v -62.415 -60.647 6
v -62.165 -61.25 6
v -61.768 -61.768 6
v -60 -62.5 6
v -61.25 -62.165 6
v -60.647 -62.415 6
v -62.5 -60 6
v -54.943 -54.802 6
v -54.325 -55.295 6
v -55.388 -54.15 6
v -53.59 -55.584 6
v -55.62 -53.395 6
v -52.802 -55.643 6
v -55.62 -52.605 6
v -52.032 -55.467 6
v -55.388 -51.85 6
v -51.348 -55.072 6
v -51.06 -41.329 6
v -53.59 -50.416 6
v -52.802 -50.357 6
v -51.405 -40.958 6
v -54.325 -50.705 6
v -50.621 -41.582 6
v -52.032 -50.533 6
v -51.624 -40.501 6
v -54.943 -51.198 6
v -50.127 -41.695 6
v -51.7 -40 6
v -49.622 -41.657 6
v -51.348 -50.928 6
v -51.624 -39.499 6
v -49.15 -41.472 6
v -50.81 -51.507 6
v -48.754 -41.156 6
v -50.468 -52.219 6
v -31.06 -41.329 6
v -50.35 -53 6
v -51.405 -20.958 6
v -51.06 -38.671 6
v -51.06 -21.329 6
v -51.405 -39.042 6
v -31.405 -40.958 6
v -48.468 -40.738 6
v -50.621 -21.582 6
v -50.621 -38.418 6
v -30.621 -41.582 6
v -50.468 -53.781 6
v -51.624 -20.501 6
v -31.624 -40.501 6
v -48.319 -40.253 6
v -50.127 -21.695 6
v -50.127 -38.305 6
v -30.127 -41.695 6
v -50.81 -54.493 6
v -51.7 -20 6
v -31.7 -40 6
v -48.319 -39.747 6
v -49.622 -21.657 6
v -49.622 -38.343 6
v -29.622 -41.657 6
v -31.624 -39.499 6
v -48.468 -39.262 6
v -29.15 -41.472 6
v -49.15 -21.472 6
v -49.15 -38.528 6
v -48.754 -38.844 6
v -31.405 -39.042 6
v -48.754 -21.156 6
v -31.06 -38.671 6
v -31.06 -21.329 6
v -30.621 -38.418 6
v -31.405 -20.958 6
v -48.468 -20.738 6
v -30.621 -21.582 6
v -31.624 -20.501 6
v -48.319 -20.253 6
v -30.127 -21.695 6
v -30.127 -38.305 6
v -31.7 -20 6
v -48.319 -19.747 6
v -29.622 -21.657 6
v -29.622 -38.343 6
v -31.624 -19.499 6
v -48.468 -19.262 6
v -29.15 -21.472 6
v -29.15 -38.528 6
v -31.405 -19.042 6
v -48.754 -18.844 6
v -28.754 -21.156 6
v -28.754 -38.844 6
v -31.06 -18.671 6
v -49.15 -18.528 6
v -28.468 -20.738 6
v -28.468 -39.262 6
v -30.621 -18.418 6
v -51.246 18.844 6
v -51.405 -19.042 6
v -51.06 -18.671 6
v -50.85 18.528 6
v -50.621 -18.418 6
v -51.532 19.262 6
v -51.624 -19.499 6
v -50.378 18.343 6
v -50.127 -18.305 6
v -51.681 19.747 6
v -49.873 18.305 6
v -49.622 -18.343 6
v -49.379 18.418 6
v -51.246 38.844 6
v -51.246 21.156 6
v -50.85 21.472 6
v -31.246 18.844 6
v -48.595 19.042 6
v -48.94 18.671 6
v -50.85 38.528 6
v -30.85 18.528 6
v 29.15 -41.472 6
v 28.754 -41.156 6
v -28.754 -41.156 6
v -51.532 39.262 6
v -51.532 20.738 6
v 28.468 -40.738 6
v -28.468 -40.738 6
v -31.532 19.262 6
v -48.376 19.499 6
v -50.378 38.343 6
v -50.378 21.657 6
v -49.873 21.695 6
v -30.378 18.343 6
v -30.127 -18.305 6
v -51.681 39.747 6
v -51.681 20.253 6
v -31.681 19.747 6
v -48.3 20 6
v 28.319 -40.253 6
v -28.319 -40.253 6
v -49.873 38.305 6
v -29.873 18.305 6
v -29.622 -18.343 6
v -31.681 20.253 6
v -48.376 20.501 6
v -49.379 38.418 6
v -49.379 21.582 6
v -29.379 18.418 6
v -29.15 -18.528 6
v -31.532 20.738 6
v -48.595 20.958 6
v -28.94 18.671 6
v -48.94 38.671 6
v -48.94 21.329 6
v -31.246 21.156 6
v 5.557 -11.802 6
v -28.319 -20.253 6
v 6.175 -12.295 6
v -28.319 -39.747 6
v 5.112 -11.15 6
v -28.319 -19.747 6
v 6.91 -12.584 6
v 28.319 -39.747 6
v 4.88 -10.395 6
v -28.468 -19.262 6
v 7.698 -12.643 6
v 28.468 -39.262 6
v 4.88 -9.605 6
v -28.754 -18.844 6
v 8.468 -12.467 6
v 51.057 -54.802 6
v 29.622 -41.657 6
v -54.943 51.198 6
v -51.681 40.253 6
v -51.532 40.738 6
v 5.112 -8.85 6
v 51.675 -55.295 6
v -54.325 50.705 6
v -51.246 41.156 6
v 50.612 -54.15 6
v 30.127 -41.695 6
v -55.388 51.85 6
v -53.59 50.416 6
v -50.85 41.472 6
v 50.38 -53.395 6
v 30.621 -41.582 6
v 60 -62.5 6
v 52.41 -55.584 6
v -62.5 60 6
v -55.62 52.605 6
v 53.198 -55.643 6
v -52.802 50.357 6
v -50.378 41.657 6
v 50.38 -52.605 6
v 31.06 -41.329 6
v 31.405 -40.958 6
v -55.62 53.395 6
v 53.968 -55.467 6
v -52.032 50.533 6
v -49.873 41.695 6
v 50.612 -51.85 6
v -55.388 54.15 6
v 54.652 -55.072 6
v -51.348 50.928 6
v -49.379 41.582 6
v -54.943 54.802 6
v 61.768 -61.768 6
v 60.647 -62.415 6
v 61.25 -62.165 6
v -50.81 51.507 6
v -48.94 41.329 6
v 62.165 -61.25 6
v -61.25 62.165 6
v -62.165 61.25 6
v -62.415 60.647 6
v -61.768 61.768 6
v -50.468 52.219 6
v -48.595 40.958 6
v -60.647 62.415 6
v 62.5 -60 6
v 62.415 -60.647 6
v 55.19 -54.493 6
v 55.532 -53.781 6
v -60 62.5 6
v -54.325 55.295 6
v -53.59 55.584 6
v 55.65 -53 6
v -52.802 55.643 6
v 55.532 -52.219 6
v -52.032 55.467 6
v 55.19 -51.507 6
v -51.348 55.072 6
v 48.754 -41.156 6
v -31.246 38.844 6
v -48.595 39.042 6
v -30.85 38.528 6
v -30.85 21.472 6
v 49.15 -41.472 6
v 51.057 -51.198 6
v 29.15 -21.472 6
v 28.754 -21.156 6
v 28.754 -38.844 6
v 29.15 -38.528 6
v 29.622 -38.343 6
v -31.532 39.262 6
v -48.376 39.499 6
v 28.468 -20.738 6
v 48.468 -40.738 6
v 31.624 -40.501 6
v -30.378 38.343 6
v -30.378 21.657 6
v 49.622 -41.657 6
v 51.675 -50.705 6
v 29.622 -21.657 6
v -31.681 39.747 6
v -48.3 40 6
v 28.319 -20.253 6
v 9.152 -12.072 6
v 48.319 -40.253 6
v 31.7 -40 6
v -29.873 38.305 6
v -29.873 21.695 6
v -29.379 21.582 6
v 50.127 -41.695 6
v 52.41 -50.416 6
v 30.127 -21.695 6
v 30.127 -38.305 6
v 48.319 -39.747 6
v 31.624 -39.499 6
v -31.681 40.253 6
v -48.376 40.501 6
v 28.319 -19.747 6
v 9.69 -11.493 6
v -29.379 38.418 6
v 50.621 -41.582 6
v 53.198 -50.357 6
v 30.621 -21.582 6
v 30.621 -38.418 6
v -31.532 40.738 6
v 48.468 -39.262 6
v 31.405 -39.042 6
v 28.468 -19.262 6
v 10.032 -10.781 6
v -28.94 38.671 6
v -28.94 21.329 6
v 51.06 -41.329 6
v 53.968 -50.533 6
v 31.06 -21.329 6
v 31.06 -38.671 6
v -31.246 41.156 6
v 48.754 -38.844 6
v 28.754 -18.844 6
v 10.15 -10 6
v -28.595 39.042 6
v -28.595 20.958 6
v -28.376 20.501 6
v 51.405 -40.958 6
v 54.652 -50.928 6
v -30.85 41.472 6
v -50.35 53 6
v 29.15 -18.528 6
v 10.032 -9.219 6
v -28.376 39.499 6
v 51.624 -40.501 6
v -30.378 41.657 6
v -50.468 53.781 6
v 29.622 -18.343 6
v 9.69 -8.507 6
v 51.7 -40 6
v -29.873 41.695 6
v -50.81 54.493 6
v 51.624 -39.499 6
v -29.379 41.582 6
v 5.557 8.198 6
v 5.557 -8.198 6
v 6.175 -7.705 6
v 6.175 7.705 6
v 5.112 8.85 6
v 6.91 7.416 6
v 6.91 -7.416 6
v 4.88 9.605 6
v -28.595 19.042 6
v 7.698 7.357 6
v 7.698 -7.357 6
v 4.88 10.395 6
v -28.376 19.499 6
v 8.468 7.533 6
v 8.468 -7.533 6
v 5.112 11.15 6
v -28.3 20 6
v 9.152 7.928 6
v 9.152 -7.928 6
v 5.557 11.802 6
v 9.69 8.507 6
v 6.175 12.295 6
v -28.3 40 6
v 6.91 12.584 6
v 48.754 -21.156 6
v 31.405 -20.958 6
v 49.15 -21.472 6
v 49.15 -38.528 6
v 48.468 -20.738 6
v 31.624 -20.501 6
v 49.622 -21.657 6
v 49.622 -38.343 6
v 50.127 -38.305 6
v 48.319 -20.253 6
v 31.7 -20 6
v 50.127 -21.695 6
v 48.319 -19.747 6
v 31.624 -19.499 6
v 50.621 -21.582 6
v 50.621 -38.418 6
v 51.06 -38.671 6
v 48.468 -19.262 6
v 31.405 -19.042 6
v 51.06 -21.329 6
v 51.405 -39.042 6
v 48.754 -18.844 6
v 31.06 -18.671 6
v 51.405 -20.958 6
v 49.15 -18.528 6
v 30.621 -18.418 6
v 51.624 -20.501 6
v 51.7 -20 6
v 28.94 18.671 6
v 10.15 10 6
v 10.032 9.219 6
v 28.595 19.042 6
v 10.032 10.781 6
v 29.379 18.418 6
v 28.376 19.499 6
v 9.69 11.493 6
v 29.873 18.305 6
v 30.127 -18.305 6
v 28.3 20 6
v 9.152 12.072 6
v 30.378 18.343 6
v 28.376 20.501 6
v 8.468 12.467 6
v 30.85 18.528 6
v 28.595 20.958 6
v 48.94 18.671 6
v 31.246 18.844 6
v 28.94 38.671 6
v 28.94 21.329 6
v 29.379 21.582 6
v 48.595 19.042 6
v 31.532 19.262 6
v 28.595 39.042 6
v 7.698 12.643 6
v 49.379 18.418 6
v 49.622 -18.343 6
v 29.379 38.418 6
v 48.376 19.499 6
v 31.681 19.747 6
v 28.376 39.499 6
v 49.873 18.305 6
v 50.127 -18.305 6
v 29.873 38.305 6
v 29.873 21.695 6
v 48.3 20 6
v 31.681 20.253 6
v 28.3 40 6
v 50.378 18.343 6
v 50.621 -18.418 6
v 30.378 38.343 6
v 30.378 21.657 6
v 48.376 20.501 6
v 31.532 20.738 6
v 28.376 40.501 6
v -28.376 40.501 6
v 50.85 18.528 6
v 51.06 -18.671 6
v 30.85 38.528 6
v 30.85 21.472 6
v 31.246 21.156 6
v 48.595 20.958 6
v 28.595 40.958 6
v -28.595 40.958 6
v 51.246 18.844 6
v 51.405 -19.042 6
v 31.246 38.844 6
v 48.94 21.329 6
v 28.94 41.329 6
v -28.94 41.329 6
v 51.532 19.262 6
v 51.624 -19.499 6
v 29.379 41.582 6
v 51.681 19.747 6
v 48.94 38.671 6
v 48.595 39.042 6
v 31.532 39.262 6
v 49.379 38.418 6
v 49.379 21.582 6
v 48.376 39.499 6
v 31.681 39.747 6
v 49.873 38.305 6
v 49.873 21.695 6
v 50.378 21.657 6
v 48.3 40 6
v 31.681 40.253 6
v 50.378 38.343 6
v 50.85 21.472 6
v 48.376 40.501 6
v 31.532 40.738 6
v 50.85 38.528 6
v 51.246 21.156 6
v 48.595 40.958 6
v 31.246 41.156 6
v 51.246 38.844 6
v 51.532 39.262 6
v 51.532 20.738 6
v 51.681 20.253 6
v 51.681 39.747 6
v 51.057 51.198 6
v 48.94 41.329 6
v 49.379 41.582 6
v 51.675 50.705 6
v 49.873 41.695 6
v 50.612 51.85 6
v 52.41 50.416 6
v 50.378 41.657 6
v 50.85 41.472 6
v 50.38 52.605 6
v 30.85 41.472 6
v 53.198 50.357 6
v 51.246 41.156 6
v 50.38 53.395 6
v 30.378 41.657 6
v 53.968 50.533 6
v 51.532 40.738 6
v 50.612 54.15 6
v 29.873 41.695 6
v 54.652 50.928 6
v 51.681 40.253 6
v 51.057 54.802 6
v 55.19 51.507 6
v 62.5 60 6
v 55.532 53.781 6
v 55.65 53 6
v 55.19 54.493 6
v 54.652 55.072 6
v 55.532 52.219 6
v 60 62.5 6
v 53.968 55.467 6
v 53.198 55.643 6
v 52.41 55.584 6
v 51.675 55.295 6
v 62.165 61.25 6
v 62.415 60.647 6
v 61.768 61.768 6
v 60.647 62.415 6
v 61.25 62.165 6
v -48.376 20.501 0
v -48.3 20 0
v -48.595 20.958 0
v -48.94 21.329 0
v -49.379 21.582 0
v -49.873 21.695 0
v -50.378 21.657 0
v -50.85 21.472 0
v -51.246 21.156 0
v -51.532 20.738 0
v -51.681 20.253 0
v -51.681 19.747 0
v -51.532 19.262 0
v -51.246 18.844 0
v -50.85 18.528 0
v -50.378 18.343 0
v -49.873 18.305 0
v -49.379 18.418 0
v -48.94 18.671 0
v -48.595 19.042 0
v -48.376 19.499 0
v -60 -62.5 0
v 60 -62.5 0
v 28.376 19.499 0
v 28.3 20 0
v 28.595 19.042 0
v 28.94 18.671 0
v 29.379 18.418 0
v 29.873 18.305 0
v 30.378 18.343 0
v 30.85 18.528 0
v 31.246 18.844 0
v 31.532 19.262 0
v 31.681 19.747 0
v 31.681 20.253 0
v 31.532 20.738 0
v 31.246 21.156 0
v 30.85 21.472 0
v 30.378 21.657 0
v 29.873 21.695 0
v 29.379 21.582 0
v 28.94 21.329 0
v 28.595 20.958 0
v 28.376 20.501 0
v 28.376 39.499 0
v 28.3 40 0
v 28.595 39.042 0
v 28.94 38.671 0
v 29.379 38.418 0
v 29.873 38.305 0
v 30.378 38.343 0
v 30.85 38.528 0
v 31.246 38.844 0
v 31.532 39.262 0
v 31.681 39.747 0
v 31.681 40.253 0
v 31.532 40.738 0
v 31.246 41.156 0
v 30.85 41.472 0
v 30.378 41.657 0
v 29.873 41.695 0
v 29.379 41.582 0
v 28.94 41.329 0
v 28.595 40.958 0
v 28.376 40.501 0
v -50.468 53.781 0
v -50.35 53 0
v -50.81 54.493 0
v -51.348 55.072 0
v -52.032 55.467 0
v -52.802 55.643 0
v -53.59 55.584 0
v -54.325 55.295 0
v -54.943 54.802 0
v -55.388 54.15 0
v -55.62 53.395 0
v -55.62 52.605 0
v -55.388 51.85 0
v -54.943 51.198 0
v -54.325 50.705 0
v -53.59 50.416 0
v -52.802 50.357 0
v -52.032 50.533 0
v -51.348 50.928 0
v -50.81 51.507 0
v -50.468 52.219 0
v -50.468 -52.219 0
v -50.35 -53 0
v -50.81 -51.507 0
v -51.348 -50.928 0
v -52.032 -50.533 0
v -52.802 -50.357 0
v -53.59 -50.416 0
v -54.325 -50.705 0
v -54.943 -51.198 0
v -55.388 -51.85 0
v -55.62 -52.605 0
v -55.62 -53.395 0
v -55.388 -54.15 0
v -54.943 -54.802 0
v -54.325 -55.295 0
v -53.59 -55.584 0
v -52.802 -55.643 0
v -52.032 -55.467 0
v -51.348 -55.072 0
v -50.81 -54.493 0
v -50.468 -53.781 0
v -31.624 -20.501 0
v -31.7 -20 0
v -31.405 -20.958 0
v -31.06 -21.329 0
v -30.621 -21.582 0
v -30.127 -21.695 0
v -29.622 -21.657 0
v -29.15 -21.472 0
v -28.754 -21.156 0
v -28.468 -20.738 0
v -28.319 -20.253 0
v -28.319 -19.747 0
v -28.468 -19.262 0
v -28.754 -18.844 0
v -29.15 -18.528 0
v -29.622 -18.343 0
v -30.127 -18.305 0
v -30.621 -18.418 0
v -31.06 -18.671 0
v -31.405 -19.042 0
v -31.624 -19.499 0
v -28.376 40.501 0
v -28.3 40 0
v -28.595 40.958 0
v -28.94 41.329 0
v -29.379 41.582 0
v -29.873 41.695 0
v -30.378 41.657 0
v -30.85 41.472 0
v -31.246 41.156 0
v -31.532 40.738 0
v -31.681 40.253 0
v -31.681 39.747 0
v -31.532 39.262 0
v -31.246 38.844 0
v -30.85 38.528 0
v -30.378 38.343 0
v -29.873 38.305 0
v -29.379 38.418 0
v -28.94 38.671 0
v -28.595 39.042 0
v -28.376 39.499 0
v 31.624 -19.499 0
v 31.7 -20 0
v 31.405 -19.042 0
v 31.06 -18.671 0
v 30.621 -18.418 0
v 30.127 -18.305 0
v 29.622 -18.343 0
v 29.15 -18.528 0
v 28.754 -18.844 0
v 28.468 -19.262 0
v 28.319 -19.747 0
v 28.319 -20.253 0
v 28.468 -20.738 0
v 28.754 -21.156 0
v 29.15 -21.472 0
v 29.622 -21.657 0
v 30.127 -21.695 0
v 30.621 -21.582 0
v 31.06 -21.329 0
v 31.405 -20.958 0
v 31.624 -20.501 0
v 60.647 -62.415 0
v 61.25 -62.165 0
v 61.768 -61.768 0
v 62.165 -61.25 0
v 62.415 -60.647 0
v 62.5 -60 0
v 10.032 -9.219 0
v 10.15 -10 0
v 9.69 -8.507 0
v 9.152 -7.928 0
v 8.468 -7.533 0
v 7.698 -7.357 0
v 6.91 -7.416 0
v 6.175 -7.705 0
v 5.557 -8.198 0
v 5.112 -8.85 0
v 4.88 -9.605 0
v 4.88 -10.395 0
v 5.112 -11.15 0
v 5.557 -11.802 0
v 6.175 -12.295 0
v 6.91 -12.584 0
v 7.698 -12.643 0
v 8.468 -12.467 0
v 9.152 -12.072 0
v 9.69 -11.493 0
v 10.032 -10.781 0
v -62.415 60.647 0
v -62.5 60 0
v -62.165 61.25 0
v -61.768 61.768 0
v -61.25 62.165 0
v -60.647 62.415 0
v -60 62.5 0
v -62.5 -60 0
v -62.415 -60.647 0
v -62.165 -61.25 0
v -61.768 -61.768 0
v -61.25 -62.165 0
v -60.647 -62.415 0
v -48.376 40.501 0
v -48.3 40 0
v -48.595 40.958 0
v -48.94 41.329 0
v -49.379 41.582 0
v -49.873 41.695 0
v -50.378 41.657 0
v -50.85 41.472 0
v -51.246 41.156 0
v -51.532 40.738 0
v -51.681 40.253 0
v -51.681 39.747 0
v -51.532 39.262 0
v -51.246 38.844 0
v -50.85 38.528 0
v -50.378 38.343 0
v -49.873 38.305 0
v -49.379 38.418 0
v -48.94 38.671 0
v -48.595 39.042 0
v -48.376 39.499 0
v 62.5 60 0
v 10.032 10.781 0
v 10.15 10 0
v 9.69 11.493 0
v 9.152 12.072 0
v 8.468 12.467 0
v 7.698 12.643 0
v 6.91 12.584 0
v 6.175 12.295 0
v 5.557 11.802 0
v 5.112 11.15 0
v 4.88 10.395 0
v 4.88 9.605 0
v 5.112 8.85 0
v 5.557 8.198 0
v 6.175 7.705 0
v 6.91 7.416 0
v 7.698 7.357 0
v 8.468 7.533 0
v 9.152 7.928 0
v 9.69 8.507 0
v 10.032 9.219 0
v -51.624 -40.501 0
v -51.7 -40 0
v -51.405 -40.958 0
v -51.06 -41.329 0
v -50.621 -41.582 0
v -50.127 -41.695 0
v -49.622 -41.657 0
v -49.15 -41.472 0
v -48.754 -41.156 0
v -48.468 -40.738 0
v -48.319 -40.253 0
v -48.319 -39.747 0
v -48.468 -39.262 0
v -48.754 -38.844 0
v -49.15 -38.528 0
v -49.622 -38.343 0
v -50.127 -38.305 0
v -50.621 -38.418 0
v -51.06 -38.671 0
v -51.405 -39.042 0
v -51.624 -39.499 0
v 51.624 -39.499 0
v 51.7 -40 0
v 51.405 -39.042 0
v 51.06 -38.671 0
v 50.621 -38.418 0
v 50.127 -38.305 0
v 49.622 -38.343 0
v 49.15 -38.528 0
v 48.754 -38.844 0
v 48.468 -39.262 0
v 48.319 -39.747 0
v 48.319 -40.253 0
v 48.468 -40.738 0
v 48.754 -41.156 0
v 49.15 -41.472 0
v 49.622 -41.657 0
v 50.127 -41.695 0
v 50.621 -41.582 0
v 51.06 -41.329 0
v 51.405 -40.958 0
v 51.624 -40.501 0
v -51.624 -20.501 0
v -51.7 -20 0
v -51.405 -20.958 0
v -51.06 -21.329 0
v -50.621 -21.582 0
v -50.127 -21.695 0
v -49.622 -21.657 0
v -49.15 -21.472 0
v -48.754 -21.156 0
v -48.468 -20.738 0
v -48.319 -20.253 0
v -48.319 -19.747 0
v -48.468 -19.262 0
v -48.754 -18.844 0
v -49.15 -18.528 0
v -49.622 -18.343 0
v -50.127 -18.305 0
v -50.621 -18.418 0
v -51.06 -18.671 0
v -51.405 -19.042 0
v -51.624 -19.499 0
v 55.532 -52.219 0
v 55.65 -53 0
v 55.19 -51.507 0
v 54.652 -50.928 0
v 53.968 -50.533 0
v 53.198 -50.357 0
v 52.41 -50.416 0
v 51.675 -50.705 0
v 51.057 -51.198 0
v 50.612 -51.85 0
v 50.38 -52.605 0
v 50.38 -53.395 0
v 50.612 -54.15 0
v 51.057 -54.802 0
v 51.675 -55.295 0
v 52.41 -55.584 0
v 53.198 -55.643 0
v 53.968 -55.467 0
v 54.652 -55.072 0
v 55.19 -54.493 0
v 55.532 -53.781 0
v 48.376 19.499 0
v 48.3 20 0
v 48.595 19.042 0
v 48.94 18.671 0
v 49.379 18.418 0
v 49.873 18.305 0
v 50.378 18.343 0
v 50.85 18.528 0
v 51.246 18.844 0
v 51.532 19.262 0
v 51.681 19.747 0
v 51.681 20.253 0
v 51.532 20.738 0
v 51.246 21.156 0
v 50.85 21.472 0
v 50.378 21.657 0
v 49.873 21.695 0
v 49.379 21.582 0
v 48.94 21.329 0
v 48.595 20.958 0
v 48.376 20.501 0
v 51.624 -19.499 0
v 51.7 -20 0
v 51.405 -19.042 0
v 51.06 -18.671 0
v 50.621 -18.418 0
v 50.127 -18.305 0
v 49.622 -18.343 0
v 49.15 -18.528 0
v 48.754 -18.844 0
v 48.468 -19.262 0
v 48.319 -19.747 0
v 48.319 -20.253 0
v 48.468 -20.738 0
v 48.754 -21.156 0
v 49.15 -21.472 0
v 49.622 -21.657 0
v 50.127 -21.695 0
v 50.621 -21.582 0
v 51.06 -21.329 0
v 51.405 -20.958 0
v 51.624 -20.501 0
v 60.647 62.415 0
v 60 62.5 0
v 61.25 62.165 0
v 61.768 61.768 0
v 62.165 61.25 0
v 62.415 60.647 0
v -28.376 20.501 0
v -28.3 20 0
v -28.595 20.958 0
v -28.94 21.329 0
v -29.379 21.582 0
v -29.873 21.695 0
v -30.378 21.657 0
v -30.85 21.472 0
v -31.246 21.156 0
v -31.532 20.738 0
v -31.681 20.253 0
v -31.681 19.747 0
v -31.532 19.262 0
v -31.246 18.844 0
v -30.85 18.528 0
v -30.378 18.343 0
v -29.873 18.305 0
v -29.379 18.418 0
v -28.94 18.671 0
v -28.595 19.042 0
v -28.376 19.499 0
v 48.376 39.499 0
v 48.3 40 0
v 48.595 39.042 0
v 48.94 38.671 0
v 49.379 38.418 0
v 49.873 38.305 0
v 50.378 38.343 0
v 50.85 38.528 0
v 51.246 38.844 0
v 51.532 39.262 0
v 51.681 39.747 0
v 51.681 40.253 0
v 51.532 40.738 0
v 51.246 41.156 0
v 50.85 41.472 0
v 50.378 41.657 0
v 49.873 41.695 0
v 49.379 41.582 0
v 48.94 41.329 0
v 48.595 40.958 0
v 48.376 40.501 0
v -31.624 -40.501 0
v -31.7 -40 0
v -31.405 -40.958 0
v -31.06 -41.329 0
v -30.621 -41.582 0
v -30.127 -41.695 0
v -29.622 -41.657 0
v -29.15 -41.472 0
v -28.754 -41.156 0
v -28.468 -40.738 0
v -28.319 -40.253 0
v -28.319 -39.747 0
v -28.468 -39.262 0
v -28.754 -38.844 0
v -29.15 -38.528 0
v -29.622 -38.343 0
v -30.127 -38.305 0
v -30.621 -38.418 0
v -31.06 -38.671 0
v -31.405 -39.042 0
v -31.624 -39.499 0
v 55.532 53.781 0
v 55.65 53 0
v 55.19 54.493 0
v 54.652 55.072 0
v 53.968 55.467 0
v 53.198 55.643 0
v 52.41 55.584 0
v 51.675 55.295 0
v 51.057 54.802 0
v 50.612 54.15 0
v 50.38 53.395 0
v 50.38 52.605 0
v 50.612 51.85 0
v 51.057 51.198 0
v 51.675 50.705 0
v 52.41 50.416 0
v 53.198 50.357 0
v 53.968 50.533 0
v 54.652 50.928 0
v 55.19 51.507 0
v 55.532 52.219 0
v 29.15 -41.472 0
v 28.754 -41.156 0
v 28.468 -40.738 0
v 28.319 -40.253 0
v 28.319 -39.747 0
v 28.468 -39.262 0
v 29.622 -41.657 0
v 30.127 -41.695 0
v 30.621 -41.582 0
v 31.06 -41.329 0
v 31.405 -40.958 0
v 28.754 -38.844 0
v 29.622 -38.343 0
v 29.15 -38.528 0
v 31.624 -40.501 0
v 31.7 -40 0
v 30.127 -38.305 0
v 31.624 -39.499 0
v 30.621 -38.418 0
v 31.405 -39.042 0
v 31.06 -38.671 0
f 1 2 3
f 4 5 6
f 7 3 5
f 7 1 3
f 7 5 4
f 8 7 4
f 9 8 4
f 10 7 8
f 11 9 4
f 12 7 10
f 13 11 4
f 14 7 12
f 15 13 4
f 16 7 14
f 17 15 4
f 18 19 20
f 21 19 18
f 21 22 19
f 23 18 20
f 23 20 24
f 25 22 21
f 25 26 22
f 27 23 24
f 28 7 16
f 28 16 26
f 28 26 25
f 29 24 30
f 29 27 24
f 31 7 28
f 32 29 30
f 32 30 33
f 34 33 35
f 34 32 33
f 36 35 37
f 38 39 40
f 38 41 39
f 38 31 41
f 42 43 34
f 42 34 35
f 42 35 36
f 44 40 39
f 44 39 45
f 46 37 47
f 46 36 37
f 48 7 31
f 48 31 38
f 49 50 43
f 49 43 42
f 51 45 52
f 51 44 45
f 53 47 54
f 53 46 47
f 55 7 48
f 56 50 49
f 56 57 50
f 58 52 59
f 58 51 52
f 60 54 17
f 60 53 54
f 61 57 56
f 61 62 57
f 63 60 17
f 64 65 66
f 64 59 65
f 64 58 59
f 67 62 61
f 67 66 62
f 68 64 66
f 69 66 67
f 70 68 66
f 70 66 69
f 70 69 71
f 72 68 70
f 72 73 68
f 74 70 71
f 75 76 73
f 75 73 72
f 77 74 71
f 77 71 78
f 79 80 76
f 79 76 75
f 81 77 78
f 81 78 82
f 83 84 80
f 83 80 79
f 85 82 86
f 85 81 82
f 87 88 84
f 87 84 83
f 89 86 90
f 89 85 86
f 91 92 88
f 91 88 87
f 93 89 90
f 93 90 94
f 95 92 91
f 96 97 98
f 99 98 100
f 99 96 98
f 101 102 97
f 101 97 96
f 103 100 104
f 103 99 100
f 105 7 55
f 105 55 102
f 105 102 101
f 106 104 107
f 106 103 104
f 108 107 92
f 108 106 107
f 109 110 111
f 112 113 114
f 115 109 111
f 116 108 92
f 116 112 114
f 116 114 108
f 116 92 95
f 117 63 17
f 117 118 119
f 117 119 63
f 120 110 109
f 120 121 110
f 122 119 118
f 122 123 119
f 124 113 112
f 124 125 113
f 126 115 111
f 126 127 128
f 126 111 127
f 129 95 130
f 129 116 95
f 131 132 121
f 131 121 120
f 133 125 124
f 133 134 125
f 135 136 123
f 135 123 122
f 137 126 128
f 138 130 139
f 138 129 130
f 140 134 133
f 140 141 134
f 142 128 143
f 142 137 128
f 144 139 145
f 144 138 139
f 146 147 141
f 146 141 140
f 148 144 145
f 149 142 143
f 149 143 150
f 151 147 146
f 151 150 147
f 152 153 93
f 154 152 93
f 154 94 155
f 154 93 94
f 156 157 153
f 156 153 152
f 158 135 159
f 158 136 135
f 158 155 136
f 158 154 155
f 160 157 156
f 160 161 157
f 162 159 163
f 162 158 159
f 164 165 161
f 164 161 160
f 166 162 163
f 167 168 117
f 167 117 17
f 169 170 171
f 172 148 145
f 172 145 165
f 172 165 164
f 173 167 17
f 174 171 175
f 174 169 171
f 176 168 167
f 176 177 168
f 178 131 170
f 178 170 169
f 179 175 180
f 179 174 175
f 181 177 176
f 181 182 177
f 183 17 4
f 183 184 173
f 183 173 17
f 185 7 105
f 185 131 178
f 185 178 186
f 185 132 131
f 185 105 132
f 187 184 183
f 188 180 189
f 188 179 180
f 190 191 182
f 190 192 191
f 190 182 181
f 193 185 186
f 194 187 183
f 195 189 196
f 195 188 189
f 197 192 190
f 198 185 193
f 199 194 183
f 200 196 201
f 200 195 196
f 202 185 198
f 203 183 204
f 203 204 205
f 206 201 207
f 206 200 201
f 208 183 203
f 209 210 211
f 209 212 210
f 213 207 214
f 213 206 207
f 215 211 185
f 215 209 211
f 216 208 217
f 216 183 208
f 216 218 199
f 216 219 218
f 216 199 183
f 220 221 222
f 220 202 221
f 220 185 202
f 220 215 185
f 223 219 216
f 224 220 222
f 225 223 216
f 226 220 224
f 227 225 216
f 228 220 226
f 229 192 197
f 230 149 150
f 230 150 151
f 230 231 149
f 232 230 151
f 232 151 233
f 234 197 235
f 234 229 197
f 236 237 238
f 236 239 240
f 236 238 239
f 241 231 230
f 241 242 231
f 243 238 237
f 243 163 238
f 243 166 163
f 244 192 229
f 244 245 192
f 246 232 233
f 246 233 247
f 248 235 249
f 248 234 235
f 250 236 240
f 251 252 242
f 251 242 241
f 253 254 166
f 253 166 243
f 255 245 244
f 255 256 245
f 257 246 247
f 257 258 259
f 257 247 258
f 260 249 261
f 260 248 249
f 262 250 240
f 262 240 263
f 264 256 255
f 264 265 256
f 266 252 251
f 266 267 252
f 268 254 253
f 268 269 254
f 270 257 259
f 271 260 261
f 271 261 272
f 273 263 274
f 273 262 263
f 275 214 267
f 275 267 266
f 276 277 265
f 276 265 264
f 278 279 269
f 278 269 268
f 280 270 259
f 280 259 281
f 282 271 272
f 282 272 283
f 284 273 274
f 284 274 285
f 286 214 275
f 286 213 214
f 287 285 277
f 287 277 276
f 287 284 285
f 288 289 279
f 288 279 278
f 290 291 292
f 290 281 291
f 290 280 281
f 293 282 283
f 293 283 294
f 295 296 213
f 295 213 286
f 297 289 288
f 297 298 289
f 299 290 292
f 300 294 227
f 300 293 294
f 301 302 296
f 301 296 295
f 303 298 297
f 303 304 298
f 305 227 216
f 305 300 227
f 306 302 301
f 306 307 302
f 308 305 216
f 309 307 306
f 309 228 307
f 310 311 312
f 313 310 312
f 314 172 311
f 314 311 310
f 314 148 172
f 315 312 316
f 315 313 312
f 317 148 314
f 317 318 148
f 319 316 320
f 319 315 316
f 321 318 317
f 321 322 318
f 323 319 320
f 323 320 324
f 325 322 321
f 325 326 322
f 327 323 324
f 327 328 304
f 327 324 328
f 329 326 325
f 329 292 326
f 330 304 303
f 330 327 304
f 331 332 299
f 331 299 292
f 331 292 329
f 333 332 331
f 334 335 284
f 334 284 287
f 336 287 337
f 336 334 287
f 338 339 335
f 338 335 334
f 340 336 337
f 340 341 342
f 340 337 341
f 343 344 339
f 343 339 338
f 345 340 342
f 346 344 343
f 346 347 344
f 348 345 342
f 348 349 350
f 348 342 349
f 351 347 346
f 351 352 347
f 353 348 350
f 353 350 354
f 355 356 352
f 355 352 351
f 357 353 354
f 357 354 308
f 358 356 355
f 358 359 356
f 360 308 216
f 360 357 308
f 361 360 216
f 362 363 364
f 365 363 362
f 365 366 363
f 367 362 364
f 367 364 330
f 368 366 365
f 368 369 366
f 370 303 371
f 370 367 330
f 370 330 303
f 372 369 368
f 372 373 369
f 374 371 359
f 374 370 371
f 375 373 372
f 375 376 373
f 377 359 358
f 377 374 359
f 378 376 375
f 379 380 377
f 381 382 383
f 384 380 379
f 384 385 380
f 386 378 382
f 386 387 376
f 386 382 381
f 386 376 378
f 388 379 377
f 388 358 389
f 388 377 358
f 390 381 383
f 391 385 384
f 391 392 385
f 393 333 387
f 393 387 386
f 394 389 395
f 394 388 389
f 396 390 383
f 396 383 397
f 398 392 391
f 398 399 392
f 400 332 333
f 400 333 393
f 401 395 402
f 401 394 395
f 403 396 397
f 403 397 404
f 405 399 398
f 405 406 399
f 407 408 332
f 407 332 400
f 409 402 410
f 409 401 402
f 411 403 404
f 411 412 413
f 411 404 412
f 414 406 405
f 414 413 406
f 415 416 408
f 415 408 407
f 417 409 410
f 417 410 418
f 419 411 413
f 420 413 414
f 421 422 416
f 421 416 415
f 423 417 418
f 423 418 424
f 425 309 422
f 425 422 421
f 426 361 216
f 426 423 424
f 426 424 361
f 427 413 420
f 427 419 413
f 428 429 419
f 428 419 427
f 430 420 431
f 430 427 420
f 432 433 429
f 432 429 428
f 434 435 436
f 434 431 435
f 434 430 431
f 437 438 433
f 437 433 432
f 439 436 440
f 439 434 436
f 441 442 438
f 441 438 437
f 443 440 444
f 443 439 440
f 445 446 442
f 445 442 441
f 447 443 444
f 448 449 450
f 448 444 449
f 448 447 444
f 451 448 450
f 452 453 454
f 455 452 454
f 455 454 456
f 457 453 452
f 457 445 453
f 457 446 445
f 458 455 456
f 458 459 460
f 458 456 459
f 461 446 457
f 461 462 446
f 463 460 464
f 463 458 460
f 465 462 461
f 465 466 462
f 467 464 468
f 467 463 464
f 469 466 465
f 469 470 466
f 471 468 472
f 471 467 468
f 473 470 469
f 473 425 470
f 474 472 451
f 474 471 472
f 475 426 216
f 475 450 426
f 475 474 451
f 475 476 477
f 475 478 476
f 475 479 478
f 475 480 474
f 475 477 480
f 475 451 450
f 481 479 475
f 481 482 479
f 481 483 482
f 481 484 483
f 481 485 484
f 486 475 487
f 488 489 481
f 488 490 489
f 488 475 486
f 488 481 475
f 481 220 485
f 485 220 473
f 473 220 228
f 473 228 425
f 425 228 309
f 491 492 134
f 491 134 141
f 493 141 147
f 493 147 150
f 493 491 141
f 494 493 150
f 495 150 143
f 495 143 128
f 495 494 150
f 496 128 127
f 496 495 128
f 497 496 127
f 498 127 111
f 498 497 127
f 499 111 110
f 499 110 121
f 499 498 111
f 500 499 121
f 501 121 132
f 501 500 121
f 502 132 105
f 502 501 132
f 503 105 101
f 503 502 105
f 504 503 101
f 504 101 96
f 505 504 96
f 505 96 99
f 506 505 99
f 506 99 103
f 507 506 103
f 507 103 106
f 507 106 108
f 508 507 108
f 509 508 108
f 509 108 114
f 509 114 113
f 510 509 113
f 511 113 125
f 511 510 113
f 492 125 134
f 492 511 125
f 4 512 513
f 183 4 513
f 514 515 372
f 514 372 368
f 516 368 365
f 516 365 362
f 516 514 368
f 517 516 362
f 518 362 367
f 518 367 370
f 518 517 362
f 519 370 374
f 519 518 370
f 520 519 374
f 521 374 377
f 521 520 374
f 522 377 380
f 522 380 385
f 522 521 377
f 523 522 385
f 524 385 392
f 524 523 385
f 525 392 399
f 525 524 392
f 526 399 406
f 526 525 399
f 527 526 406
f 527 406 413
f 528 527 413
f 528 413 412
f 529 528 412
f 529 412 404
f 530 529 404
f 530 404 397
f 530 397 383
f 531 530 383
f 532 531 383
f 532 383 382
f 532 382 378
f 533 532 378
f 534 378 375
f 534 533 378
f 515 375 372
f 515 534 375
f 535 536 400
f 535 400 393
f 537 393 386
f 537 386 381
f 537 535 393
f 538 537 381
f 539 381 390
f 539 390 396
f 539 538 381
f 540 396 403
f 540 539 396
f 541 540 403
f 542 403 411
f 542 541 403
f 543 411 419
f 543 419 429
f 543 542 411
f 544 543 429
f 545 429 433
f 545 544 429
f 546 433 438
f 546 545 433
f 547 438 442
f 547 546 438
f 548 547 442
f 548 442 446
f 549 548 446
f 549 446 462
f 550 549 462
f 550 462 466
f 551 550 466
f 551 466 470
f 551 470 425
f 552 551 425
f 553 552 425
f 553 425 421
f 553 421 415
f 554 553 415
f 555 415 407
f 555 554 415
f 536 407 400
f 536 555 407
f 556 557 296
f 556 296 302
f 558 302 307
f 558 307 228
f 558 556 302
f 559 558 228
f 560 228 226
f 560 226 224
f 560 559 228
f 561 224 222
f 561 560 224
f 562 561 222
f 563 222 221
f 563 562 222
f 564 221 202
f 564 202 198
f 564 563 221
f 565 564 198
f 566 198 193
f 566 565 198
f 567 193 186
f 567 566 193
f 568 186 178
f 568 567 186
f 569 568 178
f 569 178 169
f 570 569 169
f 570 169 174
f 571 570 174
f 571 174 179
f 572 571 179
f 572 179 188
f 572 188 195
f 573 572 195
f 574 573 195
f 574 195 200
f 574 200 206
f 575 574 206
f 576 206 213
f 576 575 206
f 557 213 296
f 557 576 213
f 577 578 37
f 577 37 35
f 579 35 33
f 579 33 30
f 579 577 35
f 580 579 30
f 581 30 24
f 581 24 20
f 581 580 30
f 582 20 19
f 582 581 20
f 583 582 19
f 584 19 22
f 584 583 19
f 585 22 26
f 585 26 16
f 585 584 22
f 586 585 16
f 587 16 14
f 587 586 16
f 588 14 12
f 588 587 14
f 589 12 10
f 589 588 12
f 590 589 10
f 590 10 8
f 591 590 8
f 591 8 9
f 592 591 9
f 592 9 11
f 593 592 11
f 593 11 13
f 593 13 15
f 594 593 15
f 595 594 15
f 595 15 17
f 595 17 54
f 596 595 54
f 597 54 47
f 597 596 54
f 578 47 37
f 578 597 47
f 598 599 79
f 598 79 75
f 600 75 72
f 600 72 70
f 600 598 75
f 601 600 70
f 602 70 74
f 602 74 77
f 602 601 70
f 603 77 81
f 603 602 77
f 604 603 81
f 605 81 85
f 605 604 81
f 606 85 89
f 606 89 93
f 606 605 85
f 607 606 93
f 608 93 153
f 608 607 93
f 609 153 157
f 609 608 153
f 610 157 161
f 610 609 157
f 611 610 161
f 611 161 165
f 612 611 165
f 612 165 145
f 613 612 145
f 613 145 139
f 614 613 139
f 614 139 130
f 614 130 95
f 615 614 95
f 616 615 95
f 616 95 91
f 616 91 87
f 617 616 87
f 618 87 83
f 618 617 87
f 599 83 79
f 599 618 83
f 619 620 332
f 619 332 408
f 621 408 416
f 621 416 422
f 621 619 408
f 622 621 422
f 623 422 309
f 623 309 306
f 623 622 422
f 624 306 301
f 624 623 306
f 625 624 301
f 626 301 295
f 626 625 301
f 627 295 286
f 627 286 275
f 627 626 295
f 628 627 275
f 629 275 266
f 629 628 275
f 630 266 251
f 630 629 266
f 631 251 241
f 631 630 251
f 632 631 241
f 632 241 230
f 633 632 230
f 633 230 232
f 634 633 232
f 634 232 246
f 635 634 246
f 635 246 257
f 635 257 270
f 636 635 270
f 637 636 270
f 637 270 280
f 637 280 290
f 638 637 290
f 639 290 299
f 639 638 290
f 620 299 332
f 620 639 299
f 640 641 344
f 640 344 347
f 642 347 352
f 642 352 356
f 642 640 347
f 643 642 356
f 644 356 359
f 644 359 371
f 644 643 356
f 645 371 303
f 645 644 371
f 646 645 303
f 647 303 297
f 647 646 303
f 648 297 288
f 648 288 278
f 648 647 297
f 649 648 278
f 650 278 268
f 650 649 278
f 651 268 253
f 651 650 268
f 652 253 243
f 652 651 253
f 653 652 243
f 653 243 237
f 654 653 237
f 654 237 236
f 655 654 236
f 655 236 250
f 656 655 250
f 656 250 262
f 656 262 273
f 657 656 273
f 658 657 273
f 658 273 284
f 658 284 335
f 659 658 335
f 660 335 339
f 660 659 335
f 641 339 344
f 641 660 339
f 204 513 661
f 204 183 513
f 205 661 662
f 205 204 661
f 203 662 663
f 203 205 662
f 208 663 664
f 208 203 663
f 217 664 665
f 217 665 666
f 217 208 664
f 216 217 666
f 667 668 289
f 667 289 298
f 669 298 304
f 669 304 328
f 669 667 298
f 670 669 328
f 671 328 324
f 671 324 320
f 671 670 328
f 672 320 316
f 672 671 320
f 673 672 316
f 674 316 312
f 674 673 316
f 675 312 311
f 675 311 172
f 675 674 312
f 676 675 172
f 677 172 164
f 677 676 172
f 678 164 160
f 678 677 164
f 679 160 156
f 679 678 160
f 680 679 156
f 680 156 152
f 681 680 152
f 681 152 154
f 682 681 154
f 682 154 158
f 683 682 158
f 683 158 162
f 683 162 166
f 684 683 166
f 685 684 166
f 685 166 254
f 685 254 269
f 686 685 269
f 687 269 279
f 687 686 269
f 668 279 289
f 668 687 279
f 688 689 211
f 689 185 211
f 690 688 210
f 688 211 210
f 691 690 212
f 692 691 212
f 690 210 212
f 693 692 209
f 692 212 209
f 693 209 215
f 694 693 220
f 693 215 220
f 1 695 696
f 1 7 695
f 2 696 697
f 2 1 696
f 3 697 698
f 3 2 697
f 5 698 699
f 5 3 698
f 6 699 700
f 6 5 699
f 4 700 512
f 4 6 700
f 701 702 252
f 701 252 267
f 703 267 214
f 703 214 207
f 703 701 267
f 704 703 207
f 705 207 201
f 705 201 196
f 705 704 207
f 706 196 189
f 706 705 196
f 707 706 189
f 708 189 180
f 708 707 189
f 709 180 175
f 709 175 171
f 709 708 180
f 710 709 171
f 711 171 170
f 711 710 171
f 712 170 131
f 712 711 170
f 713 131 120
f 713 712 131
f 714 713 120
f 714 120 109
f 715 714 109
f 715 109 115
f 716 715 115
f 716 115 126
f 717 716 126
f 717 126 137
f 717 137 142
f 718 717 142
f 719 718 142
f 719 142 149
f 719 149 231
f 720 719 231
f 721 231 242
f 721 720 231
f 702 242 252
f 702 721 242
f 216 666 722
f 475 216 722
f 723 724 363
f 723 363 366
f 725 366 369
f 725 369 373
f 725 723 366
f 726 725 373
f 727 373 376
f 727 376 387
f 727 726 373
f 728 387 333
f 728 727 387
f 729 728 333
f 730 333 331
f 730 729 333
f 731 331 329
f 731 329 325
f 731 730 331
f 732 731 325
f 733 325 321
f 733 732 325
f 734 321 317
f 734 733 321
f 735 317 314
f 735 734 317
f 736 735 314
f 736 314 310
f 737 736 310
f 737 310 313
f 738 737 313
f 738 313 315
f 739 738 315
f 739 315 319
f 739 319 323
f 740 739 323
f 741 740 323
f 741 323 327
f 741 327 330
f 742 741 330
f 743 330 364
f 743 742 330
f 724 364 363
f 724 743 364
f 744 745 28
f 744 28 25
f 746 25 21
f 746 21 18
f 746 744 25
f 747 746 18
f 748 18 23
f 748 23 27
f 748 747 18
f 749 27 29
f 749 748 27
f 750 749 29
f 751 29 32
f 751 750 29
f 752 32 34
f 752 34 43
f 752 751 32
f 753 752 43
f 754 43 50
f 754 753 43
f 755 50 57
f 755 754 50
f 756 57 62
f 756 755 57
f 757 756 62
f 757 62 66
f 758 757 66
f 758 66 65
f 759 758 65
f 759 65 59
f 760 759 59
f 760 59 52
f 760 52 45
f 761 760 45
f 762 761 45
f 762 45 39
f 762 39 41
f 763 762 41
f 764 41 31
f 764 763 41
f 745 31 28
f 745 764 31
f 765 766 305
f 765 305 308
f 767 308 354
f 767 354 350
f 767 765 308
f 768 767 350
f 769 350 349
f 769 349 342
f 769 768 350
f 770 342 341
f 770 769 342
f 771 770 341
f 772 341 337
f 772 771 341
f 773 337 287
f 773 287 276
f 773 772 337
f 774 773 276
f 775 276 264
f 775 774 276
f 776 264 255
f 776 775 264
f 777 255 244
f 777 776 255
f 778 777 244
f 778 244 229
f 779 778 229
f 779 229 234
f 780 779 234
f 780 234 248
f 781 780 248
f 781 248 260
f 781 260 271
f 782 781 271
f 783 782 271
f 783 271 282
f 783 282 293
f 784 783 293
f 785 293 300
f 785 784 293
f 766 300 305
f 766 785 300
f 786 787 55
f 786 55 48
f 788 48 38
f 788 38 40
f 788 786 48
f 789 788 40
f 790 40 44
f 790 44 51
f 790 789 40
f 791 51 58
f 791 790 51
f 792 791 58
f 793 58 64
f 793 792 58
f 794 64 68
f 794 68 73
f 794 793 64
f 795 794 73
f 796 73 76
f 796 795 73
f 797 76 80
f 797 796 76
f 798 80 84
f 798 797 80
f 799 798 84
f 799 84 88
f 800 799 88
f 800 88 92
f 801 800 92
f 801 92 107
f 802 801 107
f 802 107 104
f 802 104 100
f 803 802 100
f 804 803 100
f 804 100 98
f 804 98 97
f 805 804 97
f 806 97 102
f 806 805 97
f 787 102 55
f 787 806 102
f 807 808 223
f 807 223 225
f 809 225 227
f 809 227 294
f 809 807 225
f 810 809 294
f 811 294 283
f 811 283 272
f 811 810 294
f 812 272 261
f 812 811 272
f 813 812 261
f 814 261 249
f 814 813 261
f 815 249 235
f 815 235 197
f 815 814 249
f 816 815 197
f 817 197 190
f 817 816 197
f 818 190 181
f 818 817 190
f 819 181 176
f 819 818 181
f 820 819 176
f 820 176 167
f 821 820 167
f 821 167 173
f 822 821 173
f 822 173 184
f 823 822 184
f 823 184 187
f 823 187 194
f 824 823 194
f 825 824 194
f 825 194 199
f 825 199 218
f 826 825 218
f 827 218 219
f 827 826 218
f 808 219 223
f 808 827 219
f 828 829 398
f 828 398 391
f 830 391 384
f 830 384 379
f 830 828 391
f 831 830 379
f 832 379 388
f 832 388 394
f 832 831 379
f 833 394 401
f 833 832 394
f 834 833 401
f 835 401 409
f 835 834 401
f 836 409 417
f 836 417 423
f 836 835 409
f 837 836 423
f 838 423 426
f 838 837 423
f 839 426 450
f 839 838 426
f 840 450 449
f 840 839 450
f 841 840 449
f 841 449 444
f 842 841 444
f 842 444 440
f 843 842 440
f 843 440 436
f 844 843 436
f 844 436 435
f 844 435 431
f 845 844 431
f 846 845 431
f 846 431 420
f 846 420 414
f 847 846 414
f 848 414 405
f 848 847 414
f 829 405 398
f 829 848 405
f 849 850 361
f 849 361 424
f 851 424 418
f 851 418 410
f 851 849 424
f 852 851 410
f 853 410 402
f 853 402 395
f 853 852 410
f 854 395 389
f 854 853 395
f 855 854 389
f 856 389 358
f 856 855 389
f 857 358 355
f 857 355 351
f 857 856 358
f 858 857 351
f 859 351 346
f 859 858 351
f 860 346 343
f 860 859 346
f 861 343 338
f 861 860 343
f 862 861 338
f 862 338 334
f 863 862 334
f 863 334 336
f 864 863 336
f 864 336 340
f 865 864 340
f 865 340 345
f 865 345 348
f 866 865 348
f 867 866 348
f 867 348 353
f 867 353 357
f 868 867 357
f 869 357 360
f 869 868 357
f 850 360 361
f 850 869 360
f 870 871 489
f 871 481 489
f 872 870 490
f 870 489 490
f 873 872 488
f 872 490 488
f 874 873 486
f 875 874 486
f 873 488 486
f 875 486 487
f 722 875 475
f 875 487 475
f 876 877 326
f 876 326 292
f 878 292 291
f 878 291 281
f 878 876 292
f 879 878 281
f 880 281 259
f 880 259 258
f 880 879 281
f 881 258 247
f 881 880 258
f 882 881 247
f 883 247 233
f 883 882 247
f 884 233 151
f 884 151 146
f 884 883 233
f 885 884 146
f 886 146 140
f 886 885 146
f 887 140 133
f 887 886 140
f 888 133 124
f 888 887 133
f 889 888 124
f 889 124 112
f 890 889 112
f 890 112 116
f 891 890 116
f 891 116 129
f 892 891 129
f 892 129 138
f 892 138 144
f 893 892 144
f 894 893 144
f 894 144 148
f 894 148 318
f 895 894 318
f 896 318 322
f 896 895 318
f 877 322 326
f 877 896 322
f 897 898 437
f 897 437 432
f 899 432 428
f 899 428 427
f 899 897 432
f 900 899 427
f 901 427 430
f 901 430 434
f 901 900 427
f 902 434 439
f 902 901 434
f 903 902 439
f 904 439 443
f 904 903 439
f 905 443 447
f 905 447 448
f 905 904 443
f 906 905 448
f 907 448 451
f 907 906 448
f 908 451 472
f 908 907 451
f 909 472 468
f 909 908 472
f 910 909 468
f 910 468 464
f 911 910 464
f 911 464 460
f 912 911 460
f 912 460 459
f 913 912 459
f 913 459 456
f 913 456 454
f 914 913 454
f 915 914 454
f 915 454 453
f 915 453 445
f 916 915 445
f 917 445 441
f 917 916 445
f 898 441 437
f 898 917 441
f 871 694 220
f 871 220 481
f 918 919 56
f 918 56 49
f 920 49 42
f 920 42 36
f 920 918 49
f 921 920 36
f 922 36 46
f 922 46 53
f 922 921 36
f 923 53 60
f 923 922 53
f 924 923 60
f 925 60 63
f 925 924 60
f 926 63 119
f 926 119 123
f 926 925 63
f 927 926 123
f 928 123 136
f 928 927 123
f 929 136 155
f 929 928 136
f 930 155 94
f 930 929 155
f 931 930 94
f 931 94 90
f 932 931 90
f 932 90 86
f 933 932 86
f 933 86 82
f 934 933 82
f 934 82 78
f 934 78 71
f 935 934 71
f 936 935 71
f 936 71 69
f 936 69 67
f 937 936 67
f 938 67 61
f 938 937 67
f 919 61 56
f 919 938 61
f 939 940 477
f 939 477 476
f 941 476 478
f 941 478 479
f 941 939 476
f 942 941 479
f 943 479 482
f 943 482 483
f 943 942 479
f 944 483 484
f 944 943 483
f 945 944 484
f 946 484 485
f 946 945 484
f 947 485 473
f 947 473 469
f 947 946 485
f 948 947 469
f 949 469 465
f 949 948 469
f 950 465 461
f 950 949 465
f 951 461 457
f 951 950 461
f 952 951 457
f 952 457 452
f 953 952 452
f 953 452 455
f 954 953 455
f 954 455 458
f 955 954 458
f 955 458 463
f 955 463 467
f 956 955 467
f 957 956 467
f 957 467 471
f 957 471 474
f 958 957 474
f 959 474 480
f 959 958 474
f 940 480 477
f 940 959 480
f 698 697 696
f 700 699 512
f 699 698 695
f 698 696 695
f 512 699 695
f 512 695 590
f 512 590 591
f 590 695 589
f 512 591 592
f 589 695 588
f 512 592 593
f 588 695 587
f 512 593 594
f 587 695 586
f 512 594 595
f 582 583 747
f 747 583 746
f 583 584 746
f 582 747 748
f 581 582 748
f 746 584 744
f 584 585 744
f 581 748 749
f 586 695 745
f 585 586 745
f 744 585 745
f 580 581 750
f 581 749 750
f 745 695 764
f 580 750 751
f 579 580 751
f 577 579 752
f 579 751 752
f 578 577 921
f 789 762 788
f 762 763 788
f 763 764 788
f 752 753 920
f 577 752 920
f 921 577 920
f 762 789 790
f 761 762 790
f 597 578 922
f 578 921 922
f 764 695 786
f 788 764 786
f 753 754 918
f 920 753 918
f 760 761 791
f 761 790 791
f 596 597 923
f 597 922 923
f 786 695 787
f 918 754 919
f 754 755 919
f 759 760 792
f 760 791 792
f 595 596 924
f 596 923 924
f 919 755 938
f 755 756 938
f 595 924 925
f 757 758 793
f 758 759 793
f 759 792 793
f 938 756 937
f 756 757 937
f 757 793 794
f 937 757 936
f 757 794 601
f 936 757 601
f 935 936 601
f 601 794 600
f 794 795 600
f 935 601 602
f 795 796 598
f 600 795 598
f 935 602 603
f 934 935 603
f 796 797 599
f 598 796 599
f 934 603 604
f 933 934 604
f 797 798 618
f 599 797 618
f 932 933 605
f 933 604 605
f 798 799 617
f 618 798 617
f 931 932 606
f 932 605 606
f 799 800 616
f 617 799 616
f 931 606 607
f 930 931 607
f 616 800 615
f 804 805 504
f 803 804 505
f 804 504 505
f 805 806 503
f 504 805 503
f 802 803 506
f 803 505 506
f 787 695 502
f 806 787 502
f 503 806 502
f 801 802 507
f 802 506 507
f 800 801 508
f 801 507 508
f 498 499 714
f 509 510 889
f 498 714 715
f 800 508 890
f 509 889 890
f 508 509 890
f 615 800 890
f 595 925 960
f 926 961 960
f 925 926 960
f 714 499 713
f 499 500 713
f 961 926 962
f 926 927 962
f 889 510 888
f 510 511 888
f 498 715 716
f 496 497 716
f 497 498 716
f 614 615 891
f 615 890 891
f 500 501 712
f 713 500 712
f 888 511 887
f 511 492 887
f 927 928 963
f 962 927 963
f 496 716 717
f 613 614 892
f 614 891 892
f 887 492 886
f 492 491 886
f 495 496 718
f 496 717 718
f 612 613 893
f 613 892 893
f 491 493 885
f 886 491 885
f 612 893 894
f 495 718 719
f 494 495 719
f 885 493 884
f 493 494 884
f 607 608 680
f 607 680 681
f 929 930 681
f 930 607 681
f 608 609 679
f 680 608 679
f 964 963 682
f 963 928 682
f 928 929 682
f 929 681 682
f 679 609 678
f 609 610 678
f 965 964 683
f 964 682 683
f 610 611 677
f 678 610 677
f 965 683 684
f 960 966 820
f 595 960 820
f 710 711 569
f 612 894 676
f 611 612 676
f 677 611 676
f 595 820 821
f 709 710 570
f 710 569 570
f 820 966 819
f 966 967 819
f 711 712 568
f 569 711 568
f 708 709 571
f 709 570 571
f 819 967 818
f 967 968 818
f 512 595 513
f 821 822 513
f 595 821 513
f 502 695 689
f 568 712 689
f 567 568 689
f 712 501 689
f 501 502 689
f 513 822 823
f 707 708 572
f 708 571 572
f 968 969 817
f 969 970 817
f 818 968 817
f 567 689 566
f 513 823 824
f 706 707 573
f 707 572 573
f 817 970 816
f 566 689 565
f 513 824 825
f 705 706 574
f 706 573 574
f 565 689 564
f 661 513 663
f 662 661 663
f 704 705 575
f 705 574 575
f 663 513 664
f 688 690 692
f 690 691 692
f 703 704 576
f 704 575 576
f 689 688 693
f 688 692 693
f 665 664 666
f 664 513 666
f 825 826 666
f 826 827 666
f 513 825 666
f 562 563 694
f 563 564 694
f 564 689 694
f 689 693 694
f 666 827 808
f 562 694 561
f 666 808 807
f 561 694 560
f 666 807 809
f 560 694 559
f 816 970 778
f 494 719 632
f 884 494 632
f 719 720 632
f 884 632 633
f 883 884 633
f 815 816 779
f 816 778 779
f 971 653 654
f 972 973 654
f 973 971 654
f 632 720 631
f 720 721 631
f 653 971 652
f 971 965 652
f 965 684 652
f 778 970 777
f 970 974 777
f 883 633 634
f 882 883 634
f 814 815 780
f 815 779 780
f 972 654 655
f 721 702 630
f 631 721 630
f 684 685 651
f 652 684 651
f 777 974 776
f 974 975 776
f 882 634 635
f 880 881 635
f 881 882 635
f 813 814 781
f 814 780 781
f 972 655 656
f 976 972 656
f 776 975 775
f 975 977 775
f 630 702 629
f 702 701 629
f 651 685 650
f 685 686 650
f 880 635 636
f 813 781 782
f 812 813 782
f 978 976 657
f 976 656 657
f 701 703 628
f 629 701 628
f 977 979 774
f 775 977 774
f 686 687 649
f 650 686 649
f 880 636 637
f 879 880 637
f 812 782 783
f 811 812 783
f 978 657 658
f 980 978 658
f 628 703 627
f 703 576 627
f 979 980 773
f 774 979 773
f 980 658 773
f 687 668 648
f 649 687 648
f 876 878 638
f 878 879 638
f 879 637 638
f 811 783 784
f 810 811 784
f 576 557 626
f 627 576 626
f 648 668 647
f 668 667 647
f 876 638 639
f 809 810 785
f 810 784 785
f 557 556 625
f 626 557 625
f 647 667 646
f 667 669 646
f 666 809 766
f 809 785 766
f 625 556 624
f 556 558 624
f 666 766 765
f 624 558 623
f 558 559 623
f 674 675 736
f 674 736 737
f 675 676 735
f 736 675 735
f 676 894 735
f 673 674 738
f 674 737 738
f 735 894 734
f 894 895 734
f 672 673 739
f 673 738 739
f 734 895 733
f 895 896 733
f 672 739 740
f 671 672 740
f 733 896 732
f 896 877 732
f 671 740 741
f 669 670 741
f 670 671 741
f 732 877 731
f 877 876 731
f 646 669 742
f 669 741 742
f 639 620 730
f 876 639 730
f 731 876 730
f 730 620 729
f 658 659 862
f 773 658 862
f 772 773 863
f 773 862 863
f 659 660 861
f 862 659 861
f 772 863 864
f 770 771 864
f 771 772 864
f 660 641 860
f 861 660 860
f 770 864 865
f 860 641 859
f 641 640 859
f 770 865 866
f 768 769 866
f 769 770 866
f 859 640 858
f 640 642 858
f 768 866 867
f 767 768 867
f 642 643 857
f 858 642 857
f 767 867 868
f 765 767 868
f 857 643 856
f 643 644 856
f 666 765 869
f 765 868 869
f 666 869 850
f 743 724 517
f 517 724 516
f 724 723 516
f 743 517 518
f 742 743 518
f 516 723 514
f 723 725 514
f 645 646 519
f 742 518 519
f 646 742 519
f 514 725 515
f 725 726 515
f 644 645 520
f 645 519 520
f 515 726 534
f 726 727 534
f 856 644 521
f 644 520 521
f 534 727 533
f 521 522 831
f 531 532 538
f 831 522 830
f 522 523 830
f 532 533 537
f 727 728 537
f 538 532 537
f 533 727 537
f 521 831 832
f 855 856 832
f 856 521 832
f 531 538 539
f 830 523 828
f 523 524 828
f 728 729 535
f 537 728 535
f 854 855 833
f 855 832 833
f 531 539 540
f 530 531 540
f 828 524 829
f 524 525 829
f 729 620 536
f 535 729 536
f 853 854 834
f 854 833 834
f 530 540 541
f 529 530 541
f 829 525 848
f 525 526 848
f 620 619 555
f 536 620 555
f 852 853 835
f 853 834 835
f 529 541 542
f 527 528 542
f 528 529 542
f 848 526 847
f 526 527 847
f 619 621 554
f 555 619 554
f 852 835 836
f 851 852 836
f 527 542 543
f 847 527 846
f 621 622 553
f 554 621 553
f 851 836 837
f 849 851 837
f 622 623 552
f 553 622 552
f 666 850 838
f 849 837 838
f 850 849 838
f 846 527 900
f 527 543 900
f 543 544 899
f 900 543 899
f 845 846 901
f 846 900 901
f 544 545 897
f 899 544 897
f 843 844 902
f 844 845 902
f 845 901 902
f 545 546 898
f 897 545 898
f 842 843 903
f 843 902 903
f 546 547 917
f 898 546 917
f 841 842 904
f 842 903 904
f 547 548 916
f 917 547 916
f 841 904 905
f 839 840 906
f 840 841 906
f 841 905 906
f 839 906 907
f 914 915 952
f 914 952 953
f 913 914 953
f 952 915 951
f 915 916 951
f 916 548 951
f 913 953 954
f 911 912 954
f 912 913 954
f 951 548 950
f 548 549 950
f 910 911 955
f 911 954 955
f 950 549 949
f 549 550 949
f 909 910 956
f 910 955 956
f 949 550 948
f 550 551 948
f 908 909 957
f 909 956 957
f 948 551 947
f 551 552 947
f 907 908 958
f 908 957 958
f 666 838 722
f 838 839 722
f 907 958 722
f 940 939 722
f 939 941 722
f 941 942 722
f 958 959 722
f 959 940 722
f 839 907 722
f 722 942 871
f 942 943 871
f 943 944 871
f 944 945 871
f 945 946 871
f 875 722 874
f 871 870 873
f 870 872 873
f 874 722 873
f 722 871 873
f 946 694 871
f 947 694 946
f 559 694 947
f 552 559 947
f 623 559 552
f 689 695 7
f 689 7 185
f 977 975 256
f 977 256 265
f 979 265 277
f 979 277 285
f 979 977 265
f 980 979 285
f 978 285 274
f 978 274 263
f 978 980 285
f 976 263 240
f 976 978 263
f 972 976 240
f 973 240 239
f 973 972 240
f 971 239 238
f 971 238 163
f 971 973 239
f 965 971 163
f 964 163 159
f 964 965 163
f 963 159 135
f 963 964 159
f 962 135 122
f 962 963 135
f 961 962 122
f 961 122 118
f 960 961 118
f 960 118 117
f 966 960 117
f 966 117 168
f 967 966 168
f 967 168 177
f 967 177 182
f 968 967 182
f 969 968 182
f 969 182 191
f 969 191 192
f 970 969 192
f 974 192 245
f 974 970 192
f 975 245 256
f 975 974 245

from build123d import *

# Parameters (mm, degrees)
SKETCH1_W           = 125
SKETCH1_H           = 125
SKETCH1_R           = 1.7
SKETCH1_R_2         = 2.65
BOSS_EXTRUDE1_DEPTH = 6
FILLET1_R           = 2.5


with BuildPart() as part:
    # Sketch1 → Boss-Extrude1 (new body)
    with BuildSketch(Plane.XY):
        Rectangle(SKETCH1_W, SKETCH1_H)
        with Locations((-50, 40)):
            Circle(SKETCH1_R, mode=Mode.SUBTRACT)
        with Locations((-30, 40)):
            Circle(SKETCH1_R, mode=Mode.SUBTRACT)
        with Locations((-30, 20)):
            Circle(SKETCH1_R, mode=Mode.SUBTRACT)
        with Locations((-50, 20)):
            Circle(SKETCH1_R, mode=Mode.SUBTRACT)
        with Locations((50, 40)):
            Circle(SKETCH1_R, mode=Mode.SUBTRACT)
        with Locations((50, 20)):
            Circle(SKETCH1_R, mode=Mode.SUBTRACT)
        with Locations((30, 20)):
            Circle(SKETCH1_R, mode=Mode.SUBTRACT)
        with Locations((30, 40)):
            Circle(SKETCH1_R, mode=Mode.SUBTRACT)
        with Locations((-50, -20)):
            Circle(SKETCH1_R, mode=Mode.SUBTRACT)
        with Locations((-30, -20)):
            Circle(SKETCH1_R, mode=Mode.SUBTRACT)
        with Locations((-30, -40)):
            Circle(SKETCH1_R, mode=Mode.SUBTRACT)
        with Locations((-50, -40)):
            Circle(SKETCH1_R, mode=Mode.SUBTRACT)
        with Locations((30, -40)):
            Circle(SKETCH1_R, mode=Mode.SUBTRACT)
        with Locations((30, -20)):
            Circle(SKETCH1_R, mode=Mode.SUBTRACT)
        with Locations((50, -20)):
            Circle(SKETCH1_R, mode=Mode.SUBTRACT)
        with Locations((50, -40)):
            Circle(SKETCH1_R, mode=Mode.SUBTRACT)
        with Locations((7.5, 10)):
            Circle(SKETCH1_R_2, mode=Mode.SUBTRACT)
        with Locations((7.5, -10)):
            Circle(SKETCH1_R_2, mode=Mode.SUBTRACT)
        with Locations((-53, -53)):
            Circle(SKETCH1_R_2, mode=Mode.SUBTRACT)
        with Locations((53, -53)):
            Circle(SKETCH1_R_2, mode=Mode.SUBTRACT)
        with Locations((53, 53)):
            Circle(SKETCH1_R_2, mode=Mode.SUBTRACT)
        with Locations((-53, 53)):
            Circle(SKETCH1_R_2, mode=Mode.SUBTRACT)
    extrude(amount=BOSS_EXTRUDE1_DEPTH)

    # Fillet1
    fillet1_edges = [part.edges().sort_by_distance(p)[0] for p in [
        (-62.5, -62.5, 3),
        (62.5, -62.5, 3),
        (62.5, 62.5, 3),
        (-62.5, 62.5, 3),
    ]]
    fillet(fillet1_edges, radius=FILLET1_R)


solid = part.part
